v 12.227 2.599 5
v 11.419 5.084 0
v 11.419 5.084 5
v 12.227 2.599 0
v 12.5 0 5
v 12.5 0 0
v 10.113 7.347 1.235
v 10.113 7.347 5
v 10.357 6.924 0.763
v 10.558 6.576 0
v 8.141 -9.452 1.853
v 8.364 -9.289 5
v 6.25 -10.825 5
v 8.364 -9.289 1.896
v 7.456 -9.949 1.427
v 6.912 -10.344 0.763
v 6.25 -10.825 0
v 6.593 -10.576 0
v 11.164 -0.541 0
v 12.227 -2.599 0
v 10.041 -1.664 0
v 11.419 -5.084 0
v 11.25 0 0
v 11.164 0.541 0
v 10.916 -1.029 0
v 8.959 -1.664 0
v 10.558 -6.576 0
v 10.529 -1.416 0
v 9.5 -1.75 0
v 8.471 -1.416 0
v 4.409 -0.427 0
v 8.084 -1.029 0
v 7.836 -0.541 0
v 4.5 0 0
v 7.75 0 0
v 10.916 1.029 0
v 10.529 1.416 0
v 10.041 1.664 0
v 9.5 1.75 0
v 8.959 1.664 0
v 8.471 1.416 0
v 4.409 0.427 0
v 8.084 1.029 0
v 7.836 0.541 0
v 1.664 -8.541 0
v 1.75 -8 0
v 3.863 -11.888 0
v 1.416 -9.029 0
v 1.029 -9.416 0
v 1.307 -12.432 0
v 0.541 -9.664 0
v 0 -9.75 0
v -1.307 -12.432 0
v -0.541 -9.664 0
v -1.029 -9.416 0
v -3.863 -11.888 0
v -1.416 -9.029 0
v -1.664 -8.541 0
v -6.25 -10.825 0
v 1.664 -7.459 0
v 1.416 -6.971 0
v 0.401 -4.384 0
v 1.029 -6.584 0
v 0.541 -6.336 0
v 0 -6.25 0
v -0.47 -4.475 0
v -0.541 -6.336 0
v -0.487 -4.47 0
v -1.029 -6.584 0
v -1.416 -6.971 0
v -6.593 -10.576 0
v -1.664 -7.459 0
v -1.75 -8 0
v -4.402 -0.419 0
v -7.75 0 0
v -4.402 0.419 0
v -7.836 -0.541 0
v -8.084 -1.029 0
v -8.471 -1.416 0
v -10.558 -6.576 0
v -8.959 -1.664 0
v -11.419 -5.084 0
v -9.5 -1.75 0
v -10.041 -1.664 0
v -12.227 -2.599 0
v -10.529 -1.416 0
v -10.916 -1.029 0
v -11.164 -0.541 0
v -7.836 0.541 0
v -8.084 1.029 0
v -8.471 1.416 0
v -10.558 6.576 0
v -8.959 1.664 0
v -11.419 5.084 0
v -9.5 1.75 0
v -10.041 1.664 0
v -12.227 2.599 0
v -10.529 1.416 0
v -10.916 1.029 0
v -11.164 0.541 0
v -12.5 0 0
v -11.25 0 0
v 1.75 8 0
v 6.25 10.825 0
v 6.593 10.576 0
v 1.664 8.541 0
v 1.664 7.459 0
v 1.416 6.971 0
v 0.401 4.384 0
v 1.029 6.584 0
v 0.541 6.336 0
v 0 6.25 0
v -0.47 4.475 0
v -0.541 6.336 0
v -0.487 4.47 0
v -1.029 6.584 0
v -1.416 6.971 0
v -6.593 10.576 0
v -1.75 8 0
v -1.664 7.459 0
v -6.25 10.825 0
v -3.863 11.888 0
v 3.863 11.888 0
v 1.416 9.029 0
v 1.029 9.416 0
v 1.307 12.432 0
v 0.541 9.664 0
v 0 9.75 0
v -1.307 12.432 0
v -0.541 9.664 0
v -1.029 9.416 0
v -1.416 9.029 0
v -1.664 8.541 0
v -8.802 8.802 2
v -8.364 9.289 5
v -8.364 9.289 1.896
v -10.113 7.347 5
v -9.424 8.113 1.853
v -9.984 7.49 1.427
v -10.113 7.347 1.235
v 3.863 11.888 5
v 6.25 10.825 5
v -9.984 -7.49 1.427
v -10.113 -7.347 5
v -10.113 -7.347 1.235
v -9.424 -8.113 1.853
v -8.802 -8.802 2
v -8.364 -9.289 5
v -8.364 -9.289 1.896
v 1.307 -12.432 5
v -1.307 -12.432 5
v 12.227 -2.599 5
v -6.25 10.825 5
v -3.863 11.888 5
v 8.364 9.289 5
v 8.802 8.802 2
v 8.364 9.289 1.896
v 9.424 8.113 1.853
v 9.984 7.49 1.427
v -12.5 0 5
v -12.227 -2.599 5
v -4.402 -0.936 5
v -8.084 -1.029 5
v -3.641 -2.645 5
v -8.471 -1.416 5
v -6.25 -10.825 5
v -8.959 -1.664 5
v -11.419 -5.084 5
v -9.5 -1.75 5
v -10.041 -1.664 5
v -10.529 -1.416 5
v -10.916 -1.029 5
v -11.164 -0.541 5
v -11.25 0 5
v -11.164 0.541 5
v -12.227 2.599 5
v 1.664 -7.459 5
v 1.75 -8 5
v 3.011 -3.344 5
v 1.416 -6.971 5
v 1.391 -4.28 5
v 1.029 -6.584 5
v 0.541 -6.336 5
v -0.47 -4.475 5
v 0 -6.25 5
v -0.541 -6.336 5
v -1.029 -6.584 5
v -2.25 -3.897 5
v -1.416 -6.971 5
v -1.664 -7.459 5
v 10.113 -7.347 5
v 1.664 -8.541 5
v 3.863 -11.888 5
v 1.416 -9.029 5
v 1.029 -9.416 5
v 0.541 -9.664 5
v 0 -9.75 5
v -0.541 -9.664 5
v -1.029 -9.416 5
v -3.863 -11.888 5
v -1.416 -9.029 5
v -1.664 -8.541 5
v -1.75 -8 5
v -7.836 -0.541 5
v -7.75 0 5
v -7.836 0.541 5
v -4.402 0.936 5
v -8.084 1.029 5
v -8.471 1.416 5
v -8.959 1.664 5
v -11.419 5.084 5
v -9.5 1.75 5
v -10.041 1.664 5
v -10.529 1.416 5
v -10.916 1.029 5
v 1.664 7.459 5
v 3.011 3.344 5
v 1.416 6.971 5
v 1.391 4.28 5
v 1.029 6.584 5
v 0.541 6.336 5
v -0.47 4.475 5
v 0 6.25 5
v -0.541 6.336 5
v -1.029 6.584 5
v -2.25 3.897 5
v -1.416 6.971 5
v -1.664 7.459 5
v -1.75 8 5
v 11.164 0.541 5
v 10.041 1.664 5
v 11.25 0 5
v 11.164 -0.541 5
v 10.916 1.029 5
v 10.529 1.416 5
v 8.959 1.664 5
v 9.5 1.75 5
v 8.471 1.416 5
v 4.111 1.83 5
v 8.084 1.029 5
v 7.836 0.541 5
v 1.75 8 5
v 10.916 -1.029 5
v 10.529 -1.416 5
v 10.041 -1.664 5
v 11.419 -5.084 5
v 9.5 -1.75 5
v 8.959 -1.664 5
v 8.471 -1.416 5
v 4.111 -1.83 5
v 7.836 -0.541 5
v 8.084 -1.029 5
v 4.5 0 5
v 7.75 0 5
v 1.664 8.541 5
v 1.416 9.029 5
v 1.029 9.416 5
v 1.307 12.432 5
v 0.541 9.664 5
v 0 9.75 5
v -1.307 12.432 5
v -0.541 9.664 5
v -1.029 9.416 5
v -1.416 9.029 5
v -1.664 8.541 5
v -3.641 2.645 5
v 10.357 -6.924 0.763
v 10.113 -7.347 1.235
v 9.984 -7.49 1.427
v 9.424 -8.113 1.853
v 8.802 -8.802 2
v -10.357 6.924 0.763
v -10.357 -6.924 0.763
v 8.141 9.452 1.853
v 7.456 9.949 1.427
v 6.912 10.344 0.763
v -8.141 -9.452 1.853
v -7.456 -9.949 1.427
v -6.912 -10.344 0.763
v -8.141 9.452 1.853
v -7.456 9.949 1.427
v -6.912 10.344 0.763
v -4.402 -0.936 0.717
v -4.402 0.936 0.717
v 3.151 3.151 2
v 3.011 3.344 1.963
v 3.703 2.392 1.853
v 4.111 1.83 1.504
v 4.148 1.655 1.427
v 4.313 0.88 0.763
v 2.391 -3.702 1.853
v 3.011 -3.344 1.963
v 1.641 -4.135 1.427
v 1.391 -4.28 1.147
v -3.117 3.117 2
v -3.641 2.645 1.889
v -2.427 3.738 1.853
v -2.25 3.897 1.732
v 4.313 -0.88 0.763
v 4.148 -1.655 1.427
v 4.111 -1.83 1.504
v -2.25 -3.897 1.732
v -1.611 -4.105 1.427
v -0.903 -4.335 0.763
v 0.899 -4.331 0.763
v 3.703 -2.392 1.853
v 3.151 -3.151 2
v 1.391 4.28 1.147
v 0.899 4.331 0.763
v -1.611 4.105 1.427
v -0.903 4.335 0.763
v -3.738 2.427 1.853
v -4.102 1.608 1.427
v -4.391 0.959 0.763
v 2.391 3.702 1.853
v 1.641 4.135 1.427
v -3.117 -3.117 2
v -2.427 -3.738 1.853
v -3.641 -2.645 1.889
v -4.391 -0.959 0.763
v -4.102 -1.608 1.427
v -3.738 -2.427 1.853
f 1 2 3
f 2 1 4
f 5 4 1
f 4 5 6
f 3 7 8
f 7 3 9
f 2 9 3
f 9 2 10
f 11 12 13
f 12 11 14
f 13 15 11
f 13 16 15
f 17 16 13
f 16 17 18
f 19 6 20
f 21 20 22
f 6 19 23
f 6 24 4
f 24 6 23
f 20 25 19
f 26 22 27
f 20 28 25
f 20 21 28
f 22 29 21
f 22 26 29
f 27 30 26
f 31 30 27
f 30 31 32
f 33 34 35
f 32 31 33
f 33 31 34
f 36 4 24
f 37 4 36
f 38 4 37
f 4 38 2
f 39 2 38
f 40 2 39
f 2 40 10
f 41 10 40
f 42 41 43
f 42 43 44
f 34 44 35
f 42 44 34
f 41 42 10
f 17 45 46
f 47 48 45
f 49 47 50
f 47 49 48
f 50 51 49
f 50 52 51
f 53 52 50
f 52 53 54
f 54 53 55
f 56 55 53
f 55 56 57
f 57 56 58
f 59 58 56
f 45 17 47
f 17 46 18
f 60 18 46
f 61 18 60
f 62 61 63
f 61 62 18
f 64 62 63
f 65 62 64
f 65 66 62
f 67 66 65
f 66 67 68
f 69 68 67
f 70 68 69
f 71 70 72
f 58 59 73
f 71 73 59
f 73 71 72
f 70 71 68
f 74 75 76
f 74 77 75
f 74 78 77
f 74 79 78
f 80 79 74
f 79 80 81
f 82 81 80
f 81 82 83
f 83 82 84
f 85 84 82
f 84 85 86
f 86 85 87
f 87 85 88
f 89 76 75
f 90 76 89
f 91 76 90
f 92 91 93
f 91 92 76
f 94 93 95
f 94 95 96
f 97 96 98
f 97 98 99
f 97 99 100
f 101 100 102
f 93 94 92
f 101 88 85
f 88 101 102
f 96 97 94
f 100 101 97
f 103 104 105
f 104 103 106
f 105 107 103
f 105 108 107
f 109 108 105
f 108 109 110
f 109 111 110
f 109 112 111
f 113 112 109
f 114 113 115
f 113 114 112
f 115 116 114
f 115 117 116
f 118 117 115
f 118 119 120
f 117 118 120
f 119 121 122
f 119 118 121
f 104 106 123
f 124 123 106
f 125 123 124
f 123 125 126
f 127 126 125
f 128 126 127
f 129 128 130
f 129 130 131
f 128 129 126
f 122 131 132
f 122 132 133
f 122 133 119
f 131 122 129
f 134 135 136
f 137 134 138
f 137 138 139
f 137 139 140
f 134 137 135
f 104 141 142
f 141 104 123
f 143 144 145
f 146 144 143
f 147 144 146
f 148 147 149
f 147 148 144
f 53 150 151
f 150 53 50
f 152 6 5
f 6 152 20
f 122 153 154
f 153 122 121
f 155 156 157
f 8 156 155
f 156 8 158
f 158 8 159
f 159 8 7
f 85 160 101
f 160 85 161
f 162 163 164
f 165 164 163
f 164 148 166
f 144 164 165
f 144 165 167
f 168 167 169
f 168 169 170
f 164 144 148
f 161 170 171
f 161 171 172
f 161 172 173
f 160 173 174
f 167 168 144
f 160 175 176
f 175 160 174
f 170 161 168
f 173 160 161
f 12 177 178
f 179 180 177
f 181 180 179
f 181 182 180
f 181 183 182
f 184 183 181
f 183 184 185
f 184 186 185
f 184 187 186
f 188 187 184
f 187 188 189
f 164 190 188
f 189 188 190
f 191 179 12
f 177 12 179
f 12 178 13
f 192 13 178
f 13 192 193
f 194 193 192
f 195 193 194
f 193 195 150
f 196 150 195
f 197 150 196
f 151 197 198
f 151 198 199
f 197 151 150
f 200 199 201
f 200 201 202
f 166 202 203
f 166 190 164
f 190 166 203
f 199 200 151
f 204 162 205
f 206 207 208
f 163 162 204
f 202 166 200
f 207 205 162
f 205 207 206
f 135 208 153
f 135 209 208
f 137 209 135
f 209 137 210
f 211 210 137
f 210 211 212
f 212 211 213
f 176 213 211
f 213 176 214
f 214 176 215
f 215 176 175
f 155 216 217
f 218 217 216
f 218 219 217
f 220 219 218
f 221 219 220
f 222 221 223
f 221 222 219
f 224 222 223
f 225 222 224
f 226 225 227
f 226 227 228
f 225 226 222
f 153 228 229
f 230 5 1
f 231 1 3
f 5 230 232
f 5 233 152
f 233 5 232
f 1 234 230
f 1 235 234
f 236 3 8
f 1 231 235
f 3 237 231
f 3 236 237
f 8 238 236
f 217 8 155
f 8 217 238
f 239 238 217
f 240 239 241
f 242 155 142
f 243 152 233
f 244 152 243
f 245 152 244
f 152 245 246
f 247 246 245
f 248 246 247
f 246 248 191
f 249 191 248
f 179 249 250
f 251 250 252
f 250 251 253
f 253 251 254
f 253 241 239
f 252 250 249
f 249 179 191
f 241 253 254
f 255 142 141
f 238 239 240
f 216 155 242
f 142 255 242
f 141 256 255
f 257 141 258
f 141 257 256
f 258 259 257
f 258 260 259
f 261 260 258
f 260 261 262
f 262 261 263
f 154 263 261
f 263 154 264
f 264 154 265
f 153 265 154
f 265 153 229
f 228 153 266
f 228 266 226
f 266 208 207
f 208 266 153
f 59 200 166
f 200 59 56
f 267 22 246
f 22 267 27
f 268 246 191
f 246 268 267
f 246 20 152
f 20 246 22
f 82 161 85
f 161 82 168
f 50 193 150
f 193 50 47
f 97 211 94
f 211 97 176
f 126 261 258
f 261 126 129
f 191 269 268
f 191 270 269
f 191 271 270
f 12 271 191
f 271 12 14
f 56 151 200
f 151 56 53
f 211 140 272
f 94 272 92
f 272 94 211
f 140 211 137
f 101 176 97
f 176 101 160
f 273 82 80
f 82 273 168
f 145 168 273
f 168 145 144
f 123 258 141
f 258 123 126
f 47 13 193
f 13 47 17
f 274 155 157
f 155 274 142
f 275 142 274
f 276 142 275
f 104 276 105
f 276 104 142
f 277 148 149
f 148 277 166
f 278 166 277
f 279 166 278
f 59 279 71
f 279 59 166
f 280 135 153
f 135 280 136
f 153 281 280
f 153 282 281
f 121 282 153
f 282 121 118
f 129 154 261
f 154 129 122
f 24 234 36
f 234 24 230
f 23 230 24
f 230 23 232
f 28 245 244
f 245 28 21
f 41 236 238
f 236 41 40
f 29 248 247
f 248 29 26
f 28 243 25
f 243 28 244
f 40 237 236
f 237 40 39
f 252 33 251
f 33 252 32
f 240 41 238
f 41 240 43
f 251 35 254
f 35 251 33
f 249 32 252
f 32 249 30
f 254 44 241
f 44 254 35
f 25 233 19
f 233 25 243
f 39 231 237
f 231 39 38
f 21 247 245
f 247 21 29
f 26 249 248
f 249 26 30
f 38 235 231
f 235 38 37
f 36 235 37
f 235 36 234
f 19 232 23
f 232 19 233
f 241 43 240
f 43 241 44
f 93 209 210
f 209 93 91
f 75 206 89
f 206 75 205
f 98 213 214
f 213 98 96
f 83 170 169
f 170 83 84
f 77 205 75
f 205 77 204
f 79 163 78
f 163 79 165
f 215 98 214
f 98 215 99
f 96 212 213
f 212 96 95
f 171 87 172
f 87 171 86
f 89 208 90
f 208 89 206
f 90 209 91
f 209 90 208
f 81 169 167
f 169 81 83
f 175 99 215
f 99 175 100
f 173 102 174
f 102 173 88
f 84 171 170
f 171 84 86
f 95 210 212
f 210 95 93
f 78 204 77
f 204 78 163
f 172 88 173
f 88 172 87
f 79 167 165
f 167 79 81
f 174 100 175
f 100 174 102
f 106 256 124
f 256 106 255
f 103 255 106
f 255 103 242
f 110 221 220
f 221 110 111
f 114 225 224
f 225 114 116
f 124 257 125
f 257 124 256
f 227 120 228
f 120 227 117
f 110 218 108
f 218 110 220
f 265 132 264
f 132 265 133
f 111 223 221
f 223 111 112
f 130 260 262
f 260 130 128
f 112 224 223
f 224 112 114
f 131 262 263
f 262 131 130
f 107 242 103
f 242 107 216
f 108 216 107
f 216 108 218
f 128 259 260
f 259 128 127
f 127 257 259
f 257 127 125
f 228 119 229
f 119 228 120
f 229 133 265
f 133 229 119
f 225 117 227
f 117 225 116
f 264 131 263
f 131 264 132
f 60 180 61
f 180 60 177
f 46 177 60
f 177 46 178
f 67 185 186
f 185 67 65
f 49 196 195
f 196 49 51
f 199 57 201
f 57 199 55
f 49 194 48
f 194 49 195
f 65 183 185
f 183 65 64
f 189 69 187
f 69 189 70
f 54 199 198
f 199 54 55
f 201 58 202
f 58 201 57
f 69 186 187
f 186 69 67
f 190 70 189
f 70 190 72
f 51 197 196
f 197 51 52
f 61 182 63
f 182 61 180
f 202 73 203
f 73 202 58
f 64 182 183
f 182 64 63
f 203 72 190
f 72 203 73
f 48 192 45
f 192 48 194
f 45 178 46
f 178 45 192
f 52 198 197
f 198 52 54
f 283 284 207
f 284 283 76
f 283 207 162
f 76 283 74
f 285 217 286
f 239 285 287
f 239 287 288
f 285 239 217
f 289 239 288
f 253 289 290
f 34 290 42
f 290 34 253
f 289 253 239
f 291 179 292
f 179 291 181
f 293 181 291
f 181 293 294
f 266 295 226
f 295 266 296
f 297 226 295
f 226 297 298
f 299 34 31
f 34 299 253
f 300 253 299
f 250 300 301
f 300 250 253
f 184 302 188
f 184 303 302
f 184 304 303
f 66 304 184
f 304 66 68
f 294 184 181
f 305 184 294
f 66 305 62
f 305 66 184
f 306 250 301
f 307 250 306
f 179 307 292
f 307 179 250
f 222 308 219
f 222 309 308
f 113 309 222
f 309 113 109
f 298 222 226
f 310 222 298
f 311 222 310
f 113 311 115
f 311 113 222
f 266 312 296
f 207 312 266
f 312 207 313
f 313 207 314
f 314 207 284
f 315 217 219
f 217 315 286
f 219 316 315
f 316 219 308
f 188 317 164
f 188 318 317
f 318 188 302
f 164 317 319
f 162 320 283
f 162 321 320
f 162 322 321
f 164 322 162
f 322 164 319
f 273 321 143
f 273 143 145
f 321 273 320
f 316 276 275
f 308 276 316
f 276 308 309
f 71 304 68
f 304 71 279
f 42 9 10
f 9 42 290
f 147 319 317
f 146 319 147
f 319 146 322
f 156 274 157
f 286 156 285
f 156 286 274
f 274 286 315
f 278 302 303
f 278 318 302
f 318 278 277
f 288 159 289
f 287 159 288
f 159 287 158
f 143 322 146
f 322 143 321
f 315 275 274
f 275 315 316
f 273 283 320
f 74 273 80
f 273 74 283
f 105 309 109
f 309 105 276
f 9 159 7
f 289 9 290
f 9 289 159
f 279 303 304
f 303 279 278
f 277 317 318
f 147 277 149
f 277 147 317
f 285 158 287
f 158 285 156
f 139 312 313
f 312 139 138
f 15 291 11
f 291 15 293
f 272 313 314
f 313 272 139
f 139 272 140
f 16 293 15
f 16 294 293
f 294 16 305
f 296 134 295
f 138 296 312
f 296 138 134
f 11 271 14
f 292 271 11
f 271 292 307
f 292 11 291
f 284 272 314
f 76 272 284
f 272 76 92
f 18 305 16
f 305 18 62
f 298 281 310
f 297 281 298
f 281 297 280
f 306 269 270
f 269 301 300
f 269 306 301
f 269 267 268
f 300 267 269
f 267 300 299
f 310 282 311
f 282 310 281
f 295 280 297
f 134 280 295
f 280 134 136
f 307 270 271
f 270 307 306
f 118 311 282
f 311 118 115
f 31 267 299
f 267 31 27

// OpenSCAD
difference() {
    difference () {
        cylinder(d=25,h=5);
        translate([19/2,0,0])
        cylinder(d=3.5, h = 5,$fn=20);
        translate([-19/2,0,0])
        cylinder(d=3.5, h = 5,$fn=20);
        translate([0,16/2,0])
        cylinder(d=3.5, h = 5,$fn=20);
        translate([0,-16/2,0])
        cylinder(d=3.5, h = 5,$fn=20);
        cylinder(d = 9, h = 5);
    }
    translate([0,0,-1])
    rotate([0,90,45])
    translate([0,0,-50])
    cylinder(d = 6, h = 100, $fn = 20);
    translate([0,0,-1])
    rotate([0,90,45+90])
    translate([0,0,-50])
    cylinder(d = 6, h = 100, $fn = 20);
}
